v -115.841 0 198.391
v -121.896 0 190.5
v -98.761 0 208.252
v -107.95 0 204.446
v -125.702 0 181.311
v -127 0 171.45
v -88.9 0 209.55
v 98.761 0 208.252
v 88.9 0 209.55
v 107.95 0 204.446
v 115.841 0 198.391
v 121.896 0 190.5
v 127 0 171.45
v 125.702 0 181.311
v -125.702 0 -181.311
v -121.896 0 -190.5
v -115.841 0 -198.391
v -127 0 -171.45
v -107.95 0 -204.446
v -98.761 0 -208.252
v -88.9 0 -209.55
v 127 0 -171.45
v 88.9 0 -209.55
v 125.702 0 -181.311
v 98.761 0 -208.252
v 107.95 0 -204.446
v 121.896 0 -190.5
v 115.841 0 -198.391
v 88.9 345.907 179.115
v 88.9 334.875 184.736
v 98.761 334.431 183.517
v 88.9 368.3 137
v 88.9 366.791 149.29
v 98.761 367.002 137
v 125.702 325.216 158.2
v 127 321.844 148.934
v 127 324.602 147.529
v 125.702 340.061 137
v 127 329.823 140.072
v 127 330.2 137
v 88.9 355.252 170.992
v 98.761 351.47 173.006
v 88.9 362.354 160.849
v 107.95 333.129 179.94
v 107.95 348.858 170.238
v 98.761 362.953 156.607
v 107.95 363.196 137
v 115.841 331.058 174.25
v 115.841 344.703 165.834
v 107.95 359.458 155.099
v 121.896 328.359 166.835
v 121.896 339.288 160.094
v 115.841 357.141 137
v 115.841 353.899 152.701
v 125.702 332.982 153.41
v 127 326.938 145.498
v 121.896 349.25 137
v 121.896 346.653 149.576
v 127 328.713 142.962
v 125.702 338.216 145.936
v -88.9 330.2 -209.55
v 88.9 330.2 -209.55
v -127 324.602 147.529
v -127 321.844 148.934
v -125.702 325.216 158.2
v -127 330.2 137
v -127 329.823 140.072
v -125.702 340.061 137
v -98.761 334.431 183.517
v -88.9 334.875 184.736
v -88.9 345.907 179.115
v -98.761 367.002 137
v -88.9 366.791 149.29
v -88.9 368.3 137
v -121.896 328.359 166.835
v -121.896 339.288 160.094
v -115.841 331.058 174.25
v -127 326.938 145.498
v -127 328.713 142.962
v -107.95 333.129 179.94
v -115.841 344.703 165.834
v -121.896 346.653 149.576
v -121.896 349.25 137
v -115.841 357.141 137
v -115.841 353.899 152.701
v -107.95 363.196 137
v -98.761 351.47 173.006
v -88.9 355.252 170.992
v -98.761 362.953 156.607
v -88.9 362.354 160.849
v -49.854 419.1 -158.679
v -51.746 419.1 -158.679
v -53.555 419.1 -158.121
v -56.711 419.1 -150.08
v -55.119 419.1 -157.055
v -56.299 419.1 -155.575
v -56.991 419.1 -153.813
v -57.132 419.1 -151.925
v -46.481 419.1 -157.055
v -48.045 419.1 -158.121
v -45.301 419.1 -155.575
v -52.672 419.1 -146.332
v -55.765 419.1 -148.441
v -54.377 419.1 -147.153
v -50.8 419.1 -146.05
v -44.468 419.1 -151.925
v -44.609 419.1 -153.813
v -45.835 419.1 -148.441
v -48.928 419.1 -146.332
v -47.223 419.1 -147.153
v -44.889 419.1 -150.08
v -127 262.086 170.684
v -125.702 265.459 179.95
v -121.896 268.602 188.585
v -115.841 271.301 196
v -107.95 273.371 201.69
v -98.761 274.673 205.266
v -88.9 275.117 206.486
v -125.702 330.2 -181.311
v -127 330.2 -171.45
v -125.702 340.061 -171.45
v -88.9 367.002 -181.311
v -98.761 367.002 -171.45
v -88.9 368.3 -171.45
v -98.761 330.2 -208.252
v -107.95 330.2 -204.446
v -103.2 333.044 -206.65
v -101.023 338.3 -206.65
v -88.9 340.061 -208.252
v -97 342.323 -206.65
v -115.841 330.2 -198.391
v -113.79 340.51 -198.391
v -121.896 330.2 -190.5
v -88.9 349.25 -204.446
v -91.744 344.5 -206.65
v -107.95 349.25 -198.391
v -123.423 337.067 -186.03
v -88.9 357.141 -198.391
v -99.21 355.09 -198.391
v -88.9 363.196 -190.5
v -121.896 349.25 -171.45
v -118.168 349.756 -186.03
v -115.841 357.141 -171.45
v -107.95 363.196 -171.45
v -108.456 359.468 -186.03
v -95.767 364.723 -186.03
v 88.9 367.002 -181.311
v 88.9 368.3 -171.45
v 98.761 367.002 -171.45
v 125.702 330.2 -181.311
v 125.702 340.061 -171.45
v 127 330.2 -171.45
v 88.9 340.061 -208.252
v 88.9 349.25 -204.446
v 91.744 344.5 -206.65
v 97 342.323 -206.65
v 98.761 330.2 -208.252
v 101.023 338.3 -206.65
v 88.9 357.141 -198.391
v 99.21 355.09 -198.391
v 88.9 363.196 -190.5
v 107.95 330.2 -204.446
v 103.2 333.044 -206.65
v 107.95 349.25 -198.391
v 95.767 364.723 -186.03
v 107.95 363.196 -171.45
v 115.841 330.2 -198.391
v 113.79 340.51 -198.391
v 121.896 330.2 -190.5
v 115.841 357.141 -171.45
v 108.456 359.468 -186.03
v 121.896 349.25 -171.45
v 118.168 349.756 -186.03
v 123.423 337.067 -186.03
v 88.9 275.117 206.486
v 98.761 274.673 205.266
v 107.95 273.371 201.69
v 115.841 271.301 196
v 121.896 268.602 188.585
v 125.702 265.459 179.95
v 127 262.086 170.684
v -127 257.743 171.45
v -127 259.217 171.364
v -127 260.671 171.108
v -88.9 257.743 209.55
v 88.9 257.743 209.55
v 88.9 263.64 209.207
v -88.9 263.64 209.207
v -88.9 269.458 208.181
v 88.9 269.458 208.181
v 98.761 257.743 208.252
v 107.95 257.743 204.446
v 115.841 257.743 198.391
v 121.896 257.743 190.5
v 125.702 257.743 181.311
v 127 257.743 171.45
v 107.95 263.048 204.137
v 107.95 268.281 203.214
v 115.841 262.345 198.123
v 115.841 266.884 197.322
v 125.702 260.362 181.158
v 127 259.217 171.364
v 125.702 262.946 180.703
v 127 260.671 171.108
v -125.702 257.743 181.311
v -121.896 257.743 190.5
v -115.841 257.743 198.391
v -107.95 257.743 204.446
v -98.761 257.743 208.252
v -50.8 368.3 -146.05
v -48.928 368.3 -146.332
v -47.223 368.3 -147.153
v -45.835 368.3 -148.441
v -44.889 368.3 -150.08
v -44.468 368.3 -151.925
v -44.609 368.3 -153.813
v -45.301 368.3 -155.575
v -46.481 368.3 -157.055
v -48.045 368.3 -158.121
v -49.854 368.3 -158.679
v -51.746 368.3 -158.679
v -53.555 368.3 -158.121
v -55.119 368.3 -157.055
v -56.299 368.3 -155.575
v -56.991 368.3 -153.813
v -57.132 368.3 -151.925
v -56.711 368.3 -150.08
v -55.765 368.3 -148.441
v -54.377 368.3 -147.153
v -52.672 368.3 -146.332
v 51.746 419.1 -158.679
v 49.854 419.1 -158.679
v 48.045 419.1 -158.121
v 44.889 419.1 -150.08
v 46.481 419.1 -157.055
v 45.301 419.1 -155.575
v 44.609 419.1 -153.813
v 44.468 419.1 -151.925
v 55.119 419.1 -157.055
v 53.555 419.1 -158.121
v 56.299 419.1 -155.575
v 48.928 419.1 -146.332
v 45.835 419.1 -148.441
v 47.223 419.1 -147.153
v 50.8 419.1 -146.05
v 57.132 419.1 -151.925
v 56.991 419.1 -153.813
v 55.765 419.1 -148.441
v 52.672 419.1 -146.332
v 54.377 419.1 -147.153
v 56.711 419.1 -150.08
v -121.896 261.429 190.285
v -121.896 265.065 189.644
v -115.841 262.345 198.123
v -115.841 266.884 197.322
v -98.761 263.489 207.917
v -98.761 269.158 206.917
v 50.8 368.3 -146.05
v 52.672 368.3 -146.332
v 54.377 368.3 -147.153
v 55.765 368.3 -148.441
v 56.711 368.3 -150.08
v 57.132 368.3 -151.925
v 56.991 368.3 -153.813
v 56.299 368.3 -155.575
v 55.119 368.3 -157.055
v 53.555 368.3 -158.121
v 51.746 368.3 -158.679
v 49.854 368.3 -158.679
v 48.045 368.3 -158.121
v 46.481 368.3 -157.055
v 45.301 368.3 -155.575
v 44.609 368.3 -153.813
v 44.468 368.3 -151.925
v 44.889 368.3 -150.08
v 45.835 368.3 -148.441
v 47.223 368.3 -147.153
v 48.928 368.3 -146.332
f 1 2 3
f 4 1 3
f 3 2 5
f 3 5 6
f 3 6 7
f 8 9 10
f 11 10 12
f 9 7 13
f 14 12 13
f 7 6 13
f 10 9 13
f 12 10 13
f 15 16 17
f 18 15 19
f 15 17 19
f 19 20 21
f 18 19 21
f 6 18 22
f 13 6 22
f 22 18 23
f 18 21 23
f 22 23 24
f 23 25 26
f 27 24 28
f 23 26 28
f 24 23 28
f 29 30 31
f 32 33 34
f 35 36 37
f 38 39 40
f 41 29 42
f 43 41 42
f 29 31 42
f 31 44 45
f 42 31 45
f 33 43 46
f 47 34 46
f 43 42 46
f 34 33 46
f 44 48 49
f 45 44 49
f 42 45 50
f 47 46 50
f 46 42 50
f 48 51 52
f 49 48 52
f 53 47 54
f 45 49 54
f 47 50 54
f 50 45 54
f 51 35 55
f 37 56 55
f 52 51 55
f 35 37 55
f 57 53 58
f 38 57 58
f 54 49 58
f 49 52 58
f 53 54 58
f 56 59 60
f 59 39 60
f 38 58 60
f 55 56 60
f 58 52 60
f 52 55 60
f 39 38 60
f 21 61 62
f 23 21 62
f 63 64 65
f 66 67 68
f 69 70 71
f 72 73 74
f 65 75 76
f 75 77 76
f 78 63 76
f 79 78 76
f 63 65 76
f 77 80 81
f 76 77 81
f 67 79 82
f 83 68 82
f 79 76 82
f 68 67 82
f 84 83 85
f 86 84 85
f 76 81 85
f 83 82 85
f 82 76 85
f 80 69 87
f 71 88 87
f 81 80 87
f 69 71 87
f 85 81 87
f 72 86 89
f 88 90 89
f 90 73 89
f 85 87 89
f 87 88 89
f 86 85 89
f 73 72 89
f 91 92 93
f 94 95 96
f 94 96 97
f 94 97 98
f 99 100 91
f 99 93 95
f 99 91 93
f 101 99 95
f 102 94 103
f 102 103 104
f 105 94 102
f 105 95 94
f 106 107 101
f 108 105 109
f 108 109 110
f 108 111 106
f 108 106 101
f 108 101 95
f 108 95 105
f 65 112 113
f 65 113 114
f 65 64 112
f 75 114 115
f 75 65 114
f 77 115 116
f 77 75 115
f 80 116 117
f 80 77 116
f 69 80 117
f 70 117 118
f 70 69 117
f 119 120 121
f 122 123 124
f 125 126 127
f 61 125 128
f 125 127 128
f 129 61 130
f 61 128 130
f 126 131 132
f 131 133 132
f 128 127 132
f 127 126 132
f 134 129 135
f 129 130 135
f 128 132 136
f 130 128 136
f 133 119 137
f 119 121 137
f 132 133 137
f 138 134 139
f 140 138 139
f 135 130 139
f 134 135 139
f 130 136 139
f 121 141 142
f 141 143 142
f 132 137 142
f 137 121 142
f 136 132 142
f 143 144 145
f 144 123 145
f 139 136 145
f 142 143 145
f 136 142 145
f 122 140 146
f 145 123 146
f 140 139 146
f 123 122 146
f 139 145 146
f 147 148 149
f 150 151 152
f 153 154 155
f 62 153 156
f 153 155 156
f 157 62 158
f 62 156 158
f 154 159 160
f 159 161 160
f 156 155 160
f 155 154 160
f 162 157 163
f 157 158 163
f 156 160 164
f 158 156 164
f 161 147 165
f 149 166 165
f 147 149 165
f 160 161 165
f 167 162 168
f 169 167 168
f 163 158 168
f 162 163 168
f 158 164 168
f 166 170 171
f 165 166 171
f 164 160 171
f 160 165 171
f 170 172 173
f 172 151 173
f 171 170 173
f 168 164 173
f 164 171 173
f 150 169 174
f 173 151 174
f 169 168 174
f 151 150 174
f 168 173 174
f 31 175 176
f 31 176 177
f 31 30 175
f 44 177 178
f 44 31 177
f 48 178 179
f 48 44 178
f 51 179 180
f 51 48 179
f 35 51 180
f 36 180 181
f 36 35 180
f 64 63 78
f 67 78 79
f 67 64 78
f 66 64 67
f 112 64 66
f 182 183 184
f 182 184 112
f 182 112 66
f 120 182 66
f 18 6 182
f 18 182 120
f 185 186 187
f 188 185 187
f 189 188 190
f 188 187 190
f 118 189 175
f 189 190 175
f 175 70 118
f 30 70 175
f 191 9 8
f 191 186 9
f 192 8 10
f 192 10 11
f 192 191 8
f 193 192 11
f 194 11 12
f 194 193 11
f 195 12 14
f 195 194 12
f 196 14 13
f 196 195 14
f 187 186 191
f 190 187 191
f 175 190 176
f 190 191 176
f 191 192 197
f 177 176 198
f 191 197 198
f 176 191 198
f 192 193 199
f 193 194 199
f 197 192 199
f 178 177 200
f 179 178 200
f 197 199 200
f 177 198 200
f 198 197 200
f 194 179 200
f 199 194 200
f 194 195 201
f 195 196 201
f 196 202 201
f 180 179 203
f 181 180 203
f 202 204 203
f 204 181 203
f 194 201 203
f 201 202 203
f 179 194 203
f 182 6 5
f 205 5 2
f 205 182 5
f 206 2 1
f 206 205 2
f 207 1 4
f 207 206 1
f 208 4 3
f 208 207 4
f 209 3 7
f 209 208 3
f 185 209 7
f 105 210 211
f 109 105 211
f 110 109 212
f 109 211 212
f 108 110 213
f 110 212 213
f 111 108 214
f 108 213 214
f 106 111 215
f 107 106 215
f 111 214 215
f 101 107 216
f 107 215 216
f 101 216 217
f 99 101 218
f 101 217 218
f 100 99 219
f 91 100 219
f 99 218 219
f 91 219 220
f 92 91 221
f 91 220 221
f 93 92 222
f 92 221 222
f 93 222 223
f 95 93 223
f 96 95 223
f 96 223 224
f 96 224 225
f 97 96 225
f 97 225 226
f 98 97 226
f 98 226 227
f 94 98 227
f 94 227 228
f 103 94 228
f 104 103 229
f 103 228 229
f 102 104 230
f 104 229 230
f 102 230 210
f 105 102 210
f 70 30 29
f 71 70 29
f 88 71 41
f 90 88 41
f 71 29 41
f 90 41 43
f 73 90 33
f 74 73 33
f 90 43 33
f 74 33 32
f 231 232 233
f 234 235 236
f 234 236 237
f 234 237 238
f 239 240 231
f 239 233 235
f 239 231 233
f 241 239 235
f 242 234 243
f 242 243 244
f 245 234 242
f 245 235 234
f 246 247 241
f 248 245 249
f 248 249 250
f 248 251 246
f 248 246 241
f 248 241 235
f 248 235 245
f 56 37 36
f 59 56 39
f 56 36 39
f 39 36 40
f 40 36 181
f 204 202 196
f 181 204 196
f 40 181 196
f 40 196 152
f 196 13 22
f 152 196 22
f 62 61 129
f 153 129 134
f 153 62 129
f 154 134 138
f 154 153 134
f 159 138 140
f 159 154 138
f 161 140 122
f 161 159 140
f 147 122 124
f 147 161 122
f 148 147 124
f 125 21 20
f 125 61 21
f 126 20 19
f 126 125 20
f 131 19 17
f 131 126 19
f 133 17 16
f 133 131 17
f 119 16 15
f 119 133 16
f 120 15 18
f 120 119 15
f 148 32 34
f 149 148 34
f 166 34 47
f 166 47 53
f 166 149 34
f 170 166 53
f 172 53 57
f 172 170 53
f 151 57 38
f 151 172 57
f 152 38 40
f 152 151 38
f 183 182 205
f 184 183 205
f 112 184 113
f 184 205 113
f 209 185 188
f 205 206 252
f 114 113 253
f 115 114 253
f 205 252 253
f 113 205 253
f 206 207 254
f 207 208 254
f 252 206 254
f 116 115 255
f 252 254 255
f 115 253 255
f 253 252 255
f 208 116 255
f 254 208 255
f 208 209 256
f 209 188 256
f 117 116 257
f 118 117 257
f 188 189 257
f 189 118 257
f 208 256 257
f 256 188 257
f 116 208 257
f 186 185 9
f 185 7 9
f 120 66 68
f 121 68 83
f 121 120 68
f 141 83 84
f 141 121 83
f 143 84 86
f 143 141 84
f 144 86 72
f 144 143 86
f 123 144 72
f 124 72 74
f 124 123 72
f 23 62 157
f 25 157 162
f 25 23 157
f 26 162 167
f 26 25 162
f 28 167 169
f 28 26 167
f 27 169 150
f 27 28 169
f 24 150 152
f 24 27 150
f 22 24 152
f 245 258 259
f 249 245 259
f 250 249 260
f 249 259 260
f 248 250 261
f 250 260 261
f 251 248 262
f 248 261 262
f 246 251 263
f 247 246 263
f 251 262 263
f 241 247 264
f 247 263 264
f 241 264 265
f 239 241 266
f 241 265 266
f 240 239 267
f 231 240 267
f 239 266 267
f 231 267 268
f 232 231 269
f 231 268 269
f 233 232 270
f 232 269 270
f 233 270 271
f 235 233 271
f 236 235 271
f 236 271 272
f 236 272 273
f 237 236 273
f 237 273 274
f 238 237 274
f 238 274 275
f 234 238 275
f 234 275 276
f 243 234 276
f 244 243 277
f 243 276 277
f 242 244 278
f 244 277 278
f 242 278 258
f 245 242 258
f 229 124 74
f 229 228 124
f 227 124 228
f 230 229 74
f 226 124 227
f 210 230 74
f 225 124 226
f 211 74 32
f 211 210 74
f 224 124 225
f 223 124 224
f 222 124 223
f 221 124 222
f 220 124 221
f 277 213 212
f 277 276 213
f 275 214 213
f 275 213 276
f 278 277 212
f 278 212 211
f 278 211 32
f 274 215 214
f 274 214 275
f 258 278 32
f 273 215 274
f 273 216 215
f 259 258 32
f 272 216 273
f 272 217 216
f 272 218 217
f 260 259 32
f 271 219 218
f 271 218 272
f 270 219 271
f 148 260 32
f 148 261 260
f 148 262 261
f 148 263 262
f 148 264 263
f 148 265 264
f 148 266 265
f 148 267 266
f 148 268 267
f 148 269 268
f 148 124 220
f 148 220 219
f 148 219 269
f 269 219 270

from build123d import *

# Parameters (mm, degrees)
SKETCH1_W           = 254
SKETCH1_H           = 419.1
BOSS_EXTRUDE1_DEPTH = 368.3
CHAMFER1_SIZE       = 101.6
CHAMFER1_SIZE2      = 36.979375801
FILLET1_R           = 50.8
SKETCH2_R           = 6.35
BOSS_EXTRUDE2_DEPTH = 50.8
FILLET2_R           = 38.1
FILLET3_R           = 38.1


with BuildPart() as part:
    # Sketch1 → Boss-Extrude1 (new body)
    with BuildSketch(Plane(origin=(0, 0, 0), x_dir=(1, 0, 0), z_dir=(0, 1, 0))):
        Rectangle(SKETCH1_W, SKETCH1_H)
    extrude(amount=BOSS_EXTRUDE1_DEPTH)

    # Chamfer1
    chamfer1_edges = [part.edges().sort_by_distance(p)[0] for p in [
        (0, 368.3, 209.55),
    ]]
    chamfer1_side = [part.faces().sort_by_distance(p)[0] for p in [
        (0, 184.15, 209.55),
    ]]
    chamfer(chamfer1_edges, length=CHAMFER1_SIZE, length2=CHAMFER1_SIZE2, reference=chamfer1_side[0])

    # Fillet1
    fillet1_edges = [part.edges().sort_by_distance(p)[0] for p in [
        (0, 368.3, 172.570624199),
        (0, 266.7, 209.55),
    ]]
    fillet(fillet1_edges, radius=FILLET1_R)

    # Sketch2 → Boss-Extrude2 (add)
    with BuildSketch(Plane(origin=(0, 368.3, 0), x_dir=(1, 0, 0), z_dir=(0, 1, 0))):
        with Locations(Location((-50.8, 152.4, 0), (0, 0, 270))):
            Circle(SKETCH2_R)
        with Locations(Location((50.8, 152.4, 0), (0, 0, 270))):
            Circle(SKETCH2_R)
    extrude(amount=BOSS_EXTRUDE2_DEPTH)

    # Fillet2
    fillet2_edges = [part.edges().sort_by_distance(p)[0] for p in [
        (-127, 368.3, -36.274959371),
        (127, 128.87129469, 209.55),
        (-127, 128.87129469, 209.55),
        (-127, 304.995917971, 195.611425765),
        (-127, 359.11292385, 166.137764224),
        (-127, 266.563916805, 208.778233853),
        (127, 304.995917971, 195.611425765),
        (127, 368.3, -36.274959371),
        (127, 359.11292385, 166.137764224),
        (127, 266.563916805, 208.778233853),
    ]]
    fillet(fillet2_edges, radius=FILLET2_R)

    # Fillet3
    fillet3_edges = [part.edges().sort_by_distance(p)[0] for p in [
        (0, 368.3, -209.55),
        (-127, 165.1, -209.55),
        (127, 165.1, -209.55),
        (115.840768363, 357.140768363, -209.55),
        (-115.840768363, 357.140768363, -209.55),
    ]]
    fillet(fillet3_edges, radius=FILLET3_R)


solid = part.part
